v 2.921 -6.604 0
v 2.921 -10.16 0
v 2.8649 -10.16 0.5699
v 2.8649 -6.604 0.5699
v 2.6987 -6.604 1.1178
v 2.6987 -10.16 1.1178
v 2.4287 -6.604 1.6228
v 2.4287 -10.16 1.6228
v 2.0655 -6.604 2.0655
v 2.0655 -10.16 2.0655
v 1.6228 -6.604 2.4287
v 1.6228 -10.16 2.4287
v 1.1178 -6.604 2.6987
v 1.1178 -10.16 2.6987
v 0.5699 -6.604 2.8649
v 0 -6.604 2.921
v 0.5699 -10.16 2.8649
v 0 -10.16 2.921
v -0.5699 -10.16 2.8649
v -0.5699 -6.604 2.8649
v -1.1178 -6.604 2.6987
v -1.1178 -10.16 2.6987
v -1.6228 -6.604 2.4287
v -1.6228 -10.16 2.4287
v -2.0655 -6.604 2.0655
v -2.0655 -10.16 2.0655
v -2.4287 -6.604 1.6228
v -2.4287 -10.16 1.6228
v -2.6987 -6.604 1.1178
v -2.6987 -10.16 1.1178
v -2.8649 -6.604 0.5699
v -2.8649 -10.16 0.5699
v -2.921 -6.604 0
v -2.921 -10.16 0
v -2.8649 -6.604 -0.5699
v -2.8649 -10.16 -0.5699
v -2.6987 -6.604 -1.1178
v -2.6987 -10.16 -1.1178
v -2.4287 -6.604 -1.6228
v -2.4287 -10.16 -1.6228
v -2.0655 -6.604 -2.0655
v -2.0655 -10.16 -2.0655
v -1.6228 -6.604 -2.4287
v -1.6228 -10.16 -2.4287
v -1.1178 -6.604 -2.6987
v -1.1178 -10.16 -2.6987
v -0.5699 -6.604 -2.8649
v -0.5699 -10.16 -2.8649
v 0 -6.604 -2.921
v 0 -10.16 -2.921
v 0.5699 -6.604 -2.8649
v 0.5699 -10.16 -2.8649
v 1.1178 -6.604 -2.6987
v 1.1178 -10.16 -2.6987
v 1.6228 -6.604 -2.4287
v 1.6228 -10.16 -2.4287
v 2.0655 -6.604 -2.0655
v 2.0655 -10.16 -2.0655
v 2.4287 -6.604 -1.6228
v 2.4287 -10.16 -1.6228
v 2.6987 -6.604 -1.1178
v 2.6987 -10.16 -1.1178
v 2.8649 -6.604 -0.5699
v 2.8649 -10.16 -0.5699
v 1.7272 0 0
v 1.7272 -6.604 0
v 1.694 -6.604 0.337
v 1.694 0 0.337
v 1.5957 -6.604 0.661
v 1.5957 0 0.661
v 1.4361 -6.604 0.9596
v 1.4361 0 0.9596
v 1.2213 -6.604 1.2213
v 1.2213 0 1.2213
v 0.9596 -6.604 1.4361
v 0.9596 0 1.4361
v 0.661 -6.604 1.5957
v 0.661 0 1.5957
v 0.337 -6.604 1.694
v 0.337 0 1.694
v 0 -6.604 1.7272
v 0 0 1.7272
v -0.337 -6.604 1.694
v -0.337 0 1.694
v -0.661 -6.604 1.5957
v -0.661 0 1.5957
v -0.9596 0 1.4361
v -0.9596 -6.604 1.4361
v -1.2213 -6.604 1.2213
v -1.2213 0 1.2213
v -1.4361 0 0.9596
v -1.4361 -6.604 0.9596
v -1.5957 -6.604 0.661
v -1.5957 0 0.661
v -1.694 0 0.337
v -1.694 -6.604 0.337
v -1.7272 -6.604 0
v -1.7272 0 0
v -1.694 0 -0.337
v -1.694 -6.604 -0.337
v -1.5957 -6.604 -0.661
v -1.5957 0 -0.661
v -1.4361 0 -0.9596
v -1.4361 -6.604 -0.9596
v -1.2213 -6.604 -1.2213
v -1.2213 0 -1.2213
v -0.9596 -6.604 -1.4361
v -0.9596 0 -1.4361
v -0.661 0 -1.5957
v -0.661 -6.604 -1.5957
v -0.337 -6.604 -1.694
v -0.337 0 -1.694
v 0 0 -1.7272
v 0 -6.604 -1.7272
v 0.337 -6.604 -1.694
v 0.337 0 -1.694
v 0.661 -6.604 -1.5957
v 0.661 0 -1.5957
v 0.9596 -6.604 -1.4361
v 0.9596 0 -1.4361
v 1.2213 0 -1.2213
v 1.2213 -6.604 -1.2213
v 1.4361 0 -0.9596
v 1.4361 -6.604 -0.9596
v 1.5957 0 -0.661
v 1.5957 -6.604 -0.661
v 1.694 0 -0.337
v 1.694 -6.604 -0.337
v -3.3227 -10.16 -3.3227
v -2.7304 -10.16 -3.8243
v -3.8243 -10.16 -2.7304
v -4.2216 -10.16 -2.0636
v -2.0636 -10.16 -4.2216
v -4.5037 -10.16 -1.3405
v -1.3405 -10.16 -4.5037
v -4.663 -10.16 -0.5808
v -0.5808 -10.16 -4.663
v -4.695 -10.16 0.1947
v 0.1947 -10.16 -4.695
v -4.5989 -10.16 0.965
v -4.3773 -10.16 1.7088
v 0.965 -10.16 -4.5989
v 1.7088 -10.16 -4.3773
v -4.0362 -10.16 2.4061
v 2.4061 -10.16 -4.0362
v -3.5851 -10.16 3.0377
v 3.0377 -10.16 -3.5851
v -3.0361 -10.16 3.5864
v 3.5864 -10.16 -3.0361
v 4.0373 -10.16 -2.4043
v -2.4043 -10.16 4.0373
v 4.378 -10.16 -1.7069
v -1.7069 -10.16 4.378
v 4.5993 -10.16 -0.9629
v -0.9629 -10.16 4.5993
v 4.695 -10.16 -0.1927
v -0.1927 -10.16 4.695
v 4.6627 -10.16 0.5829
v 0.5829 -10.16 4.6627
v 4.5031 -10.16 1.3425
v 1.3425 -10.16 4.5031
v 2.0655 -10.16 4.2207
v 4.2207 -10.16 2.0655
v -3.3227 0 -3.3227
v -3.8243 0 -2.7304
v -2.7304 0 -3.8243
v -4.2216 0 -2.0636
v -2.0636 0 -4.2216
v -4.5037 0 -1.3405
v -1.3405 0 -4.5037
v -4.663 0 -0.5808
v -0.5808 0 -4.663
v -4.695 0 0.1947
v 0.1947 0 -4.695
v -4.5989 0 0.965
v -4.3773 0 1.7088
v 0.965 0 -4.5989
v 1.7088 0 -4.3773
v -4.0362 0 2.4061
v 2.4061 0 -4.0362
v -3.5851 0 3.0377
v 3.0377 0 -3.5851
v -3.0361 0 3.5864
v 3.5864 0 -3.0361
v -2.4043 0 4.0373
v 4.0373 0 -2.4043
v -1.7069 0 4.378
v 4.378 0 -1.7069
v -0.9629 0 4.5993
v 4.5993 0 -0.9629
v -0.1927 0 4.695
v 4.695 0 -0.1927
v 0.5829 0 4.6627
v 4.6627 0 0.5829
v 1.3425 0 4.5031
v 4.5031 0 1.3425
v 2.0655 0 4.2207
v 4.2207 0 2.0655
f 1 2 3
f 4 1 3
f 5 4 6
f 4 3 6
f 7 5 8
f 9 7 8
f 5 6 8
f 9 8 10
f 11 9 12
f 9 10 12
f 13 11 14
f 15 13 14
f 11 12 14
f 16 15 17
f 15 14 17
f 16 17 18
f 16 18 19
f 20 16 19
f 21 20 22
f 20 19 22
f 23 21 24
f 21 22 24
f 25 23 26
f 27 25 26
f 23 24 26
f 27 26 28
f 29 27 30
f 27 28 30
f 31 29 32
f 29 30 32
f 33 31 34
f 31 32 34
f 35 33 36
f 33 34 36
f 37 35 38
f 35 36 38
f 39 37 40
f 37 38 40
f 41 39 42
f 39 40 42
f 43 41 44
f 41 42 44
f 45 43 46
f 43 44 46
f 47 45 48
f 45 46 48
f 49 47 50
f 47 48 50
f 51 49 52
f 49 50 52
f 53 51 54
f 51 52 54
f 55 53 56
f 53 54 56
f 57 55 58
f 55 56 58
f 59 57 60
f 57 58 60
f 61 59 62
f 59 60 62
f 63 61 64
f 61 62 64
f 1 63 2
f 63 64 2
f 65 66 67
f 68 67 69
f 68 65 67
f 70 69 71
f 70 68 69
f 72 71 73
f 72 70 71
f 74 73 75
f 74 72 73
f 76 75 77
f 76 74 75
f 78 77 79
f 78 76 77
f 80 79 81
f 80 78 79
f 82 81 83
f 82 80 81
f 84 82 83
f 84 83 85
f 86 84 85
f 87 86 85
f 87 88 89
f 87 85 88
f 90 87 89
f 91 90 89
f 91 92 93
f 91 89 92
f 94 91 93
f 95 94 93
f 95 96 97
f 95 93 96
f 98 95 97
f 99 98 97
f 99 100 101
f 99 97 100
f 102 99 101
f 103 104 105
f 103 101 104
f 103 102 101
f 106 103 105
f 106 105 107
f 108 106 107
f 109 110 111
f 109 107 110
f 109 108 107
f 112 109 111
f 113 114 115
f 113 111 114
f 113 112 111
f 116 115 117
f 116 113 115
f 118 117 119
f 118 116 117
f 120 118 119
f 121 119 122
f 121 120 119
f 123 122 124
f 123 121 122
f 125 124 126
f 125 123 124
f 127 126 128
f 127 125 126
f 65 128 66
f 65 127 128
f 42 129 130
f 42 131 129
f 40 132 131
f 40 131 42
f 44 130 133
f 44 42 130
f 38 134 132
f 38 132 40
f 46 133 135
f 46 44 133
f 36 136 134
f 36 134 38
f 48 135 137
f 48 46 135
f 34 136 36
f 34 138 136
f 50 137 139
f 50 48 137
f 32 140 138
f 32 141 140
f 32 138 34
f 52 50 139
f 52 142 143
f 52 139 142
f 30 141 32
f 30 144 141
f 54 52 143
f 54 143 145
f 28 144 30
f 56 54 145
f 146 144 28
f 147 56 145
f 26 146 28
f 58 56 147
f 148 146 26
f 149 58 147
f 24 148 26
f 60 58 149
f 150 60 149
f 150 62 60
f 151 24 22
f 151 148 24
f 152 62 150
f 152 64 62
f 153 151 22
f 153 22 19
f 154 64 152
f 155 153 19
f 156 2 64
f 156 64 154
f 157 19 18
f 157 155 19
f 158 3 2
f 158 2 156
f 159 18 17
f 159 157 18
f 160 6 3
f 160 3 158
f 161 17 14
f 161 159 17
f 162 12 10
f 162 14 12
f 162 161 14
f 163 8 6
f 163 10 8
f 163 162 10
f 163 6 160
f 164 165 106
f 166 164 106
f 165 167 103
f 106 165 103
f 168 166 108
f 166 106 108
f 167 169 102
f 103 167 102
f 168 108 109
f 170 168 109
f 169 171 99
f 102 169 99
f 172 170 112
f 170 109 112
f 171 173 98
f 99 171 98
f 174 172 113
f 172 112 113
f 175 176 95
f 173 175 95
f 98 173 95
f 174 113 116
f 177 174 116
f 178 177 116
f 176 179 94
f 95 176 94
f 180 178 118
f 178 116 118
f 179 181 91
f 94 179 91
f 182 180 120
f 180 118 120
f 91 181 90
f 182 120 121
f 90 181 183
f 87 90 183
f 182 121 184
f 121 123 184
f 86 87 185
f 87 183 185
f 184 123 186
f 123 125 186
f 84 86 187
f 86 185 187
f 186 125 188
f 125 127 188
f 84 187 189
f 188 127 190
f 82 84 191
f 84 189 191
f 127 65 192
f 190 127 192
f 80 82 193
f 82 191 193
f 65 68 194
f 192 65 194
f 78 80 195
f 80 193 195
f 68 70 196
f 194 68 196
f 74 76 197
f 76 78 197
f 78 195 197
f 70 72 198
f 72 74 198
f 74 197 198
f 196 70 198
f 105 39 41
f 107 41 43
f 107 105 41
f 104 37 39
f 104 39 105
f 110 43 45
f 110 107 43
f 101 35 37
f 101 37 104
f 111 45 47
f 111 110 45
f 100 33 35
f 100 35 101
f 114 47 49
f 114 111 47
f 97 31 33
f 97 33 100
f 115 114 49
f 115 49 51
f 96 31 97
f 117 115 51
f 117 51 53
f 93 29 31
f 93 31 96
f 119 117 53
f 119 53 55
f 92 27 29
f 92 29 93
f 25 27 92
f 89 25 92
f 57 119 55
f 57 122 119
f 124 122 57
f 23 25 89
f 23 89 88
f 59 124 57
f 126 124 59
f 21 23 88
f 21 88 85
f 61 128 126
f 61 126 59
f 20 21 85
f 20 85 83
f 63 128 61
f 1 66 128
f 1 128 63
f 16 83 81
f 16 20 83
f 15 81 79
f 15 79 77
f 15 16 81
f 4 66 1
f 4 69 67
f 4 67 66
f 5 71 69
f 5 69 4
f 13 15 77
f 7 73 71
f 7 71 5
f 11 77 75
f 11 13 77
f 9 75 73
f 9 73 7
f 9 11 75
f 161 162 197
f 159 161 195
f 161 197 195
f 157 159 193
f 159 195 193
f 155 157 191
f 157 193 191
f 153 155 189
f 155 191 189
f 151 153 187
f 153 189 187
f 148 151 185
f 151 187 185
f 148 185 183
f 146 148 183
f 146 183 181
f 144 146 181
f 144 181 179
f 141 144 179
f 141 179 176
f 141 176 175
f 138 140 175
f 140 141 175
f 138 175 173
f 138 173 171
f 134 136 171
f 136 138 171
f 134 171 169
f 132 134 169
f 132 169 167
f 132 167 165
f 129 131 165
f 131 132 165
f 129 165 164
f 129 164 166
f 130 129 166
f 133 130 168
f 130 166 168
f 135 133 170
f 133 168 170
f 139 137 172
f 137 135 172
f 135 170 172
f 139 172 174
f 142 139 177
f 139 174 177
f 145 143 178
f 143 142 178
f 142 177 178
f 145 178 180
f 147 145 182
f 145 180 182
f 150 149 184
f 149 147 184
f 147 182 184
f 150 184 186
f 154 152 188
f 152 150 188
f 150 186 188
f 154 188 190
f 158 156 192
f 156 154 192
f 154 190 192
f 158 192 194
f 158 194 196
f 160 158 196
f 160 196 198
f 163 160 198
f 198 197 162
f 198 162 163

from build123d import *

# Parameters (mm, degrees)
F0_R     = 4.699
F0_R_2   = 1.7272
F1_DEPTH = 10.16
F3_DEPTH = 10.161
F4_R     = 2.921
F4_R_2   = 1.7272
F4_R_3   = 1.7145
F5_DEPTH = 3.556


with BuildPart() as f1:
    # F0 (on Front) → F1 (new body)
    with BuildSketch(Plane.XZ):
        Circle(F0_R)
        Circle(F0_R_2, mode=Mode.SUBTRACT)
    extrude(amount=F1_DEPTH)

    # F2 (on face) → F3 (cut, through all)
    with BuildSketch(Plane.XZ.offset(10.16)):
        with BuildLine():
            ThreePointArc((4.2207203769, 2.0654589078), (3.3226947648, 3.3226947648), (2.0654589078, 4.2207203769))
            Line((2.0654589078, 4.2207203769), (4.2207203769, 2.0654589078))
        make_face()
    extrude(amount=-F3_DEPTH, mode=Mode.SUBTRACT)

    # F4 (on face) → F5 (cut)
    with BuildSketch(Plane.XZ.offset(10.16)):
        Circle(F4_R)
        Circle(F4_R_2, mode=Mode.SUBTRACT)
        Circle(F4_R_2)
        Circle(F4_R_3, mode=Mode.SUBTRACT)
    extrude(amount=-F5_DEPTH, mode=Mode.SUBTRACT)


solid = f1.part
